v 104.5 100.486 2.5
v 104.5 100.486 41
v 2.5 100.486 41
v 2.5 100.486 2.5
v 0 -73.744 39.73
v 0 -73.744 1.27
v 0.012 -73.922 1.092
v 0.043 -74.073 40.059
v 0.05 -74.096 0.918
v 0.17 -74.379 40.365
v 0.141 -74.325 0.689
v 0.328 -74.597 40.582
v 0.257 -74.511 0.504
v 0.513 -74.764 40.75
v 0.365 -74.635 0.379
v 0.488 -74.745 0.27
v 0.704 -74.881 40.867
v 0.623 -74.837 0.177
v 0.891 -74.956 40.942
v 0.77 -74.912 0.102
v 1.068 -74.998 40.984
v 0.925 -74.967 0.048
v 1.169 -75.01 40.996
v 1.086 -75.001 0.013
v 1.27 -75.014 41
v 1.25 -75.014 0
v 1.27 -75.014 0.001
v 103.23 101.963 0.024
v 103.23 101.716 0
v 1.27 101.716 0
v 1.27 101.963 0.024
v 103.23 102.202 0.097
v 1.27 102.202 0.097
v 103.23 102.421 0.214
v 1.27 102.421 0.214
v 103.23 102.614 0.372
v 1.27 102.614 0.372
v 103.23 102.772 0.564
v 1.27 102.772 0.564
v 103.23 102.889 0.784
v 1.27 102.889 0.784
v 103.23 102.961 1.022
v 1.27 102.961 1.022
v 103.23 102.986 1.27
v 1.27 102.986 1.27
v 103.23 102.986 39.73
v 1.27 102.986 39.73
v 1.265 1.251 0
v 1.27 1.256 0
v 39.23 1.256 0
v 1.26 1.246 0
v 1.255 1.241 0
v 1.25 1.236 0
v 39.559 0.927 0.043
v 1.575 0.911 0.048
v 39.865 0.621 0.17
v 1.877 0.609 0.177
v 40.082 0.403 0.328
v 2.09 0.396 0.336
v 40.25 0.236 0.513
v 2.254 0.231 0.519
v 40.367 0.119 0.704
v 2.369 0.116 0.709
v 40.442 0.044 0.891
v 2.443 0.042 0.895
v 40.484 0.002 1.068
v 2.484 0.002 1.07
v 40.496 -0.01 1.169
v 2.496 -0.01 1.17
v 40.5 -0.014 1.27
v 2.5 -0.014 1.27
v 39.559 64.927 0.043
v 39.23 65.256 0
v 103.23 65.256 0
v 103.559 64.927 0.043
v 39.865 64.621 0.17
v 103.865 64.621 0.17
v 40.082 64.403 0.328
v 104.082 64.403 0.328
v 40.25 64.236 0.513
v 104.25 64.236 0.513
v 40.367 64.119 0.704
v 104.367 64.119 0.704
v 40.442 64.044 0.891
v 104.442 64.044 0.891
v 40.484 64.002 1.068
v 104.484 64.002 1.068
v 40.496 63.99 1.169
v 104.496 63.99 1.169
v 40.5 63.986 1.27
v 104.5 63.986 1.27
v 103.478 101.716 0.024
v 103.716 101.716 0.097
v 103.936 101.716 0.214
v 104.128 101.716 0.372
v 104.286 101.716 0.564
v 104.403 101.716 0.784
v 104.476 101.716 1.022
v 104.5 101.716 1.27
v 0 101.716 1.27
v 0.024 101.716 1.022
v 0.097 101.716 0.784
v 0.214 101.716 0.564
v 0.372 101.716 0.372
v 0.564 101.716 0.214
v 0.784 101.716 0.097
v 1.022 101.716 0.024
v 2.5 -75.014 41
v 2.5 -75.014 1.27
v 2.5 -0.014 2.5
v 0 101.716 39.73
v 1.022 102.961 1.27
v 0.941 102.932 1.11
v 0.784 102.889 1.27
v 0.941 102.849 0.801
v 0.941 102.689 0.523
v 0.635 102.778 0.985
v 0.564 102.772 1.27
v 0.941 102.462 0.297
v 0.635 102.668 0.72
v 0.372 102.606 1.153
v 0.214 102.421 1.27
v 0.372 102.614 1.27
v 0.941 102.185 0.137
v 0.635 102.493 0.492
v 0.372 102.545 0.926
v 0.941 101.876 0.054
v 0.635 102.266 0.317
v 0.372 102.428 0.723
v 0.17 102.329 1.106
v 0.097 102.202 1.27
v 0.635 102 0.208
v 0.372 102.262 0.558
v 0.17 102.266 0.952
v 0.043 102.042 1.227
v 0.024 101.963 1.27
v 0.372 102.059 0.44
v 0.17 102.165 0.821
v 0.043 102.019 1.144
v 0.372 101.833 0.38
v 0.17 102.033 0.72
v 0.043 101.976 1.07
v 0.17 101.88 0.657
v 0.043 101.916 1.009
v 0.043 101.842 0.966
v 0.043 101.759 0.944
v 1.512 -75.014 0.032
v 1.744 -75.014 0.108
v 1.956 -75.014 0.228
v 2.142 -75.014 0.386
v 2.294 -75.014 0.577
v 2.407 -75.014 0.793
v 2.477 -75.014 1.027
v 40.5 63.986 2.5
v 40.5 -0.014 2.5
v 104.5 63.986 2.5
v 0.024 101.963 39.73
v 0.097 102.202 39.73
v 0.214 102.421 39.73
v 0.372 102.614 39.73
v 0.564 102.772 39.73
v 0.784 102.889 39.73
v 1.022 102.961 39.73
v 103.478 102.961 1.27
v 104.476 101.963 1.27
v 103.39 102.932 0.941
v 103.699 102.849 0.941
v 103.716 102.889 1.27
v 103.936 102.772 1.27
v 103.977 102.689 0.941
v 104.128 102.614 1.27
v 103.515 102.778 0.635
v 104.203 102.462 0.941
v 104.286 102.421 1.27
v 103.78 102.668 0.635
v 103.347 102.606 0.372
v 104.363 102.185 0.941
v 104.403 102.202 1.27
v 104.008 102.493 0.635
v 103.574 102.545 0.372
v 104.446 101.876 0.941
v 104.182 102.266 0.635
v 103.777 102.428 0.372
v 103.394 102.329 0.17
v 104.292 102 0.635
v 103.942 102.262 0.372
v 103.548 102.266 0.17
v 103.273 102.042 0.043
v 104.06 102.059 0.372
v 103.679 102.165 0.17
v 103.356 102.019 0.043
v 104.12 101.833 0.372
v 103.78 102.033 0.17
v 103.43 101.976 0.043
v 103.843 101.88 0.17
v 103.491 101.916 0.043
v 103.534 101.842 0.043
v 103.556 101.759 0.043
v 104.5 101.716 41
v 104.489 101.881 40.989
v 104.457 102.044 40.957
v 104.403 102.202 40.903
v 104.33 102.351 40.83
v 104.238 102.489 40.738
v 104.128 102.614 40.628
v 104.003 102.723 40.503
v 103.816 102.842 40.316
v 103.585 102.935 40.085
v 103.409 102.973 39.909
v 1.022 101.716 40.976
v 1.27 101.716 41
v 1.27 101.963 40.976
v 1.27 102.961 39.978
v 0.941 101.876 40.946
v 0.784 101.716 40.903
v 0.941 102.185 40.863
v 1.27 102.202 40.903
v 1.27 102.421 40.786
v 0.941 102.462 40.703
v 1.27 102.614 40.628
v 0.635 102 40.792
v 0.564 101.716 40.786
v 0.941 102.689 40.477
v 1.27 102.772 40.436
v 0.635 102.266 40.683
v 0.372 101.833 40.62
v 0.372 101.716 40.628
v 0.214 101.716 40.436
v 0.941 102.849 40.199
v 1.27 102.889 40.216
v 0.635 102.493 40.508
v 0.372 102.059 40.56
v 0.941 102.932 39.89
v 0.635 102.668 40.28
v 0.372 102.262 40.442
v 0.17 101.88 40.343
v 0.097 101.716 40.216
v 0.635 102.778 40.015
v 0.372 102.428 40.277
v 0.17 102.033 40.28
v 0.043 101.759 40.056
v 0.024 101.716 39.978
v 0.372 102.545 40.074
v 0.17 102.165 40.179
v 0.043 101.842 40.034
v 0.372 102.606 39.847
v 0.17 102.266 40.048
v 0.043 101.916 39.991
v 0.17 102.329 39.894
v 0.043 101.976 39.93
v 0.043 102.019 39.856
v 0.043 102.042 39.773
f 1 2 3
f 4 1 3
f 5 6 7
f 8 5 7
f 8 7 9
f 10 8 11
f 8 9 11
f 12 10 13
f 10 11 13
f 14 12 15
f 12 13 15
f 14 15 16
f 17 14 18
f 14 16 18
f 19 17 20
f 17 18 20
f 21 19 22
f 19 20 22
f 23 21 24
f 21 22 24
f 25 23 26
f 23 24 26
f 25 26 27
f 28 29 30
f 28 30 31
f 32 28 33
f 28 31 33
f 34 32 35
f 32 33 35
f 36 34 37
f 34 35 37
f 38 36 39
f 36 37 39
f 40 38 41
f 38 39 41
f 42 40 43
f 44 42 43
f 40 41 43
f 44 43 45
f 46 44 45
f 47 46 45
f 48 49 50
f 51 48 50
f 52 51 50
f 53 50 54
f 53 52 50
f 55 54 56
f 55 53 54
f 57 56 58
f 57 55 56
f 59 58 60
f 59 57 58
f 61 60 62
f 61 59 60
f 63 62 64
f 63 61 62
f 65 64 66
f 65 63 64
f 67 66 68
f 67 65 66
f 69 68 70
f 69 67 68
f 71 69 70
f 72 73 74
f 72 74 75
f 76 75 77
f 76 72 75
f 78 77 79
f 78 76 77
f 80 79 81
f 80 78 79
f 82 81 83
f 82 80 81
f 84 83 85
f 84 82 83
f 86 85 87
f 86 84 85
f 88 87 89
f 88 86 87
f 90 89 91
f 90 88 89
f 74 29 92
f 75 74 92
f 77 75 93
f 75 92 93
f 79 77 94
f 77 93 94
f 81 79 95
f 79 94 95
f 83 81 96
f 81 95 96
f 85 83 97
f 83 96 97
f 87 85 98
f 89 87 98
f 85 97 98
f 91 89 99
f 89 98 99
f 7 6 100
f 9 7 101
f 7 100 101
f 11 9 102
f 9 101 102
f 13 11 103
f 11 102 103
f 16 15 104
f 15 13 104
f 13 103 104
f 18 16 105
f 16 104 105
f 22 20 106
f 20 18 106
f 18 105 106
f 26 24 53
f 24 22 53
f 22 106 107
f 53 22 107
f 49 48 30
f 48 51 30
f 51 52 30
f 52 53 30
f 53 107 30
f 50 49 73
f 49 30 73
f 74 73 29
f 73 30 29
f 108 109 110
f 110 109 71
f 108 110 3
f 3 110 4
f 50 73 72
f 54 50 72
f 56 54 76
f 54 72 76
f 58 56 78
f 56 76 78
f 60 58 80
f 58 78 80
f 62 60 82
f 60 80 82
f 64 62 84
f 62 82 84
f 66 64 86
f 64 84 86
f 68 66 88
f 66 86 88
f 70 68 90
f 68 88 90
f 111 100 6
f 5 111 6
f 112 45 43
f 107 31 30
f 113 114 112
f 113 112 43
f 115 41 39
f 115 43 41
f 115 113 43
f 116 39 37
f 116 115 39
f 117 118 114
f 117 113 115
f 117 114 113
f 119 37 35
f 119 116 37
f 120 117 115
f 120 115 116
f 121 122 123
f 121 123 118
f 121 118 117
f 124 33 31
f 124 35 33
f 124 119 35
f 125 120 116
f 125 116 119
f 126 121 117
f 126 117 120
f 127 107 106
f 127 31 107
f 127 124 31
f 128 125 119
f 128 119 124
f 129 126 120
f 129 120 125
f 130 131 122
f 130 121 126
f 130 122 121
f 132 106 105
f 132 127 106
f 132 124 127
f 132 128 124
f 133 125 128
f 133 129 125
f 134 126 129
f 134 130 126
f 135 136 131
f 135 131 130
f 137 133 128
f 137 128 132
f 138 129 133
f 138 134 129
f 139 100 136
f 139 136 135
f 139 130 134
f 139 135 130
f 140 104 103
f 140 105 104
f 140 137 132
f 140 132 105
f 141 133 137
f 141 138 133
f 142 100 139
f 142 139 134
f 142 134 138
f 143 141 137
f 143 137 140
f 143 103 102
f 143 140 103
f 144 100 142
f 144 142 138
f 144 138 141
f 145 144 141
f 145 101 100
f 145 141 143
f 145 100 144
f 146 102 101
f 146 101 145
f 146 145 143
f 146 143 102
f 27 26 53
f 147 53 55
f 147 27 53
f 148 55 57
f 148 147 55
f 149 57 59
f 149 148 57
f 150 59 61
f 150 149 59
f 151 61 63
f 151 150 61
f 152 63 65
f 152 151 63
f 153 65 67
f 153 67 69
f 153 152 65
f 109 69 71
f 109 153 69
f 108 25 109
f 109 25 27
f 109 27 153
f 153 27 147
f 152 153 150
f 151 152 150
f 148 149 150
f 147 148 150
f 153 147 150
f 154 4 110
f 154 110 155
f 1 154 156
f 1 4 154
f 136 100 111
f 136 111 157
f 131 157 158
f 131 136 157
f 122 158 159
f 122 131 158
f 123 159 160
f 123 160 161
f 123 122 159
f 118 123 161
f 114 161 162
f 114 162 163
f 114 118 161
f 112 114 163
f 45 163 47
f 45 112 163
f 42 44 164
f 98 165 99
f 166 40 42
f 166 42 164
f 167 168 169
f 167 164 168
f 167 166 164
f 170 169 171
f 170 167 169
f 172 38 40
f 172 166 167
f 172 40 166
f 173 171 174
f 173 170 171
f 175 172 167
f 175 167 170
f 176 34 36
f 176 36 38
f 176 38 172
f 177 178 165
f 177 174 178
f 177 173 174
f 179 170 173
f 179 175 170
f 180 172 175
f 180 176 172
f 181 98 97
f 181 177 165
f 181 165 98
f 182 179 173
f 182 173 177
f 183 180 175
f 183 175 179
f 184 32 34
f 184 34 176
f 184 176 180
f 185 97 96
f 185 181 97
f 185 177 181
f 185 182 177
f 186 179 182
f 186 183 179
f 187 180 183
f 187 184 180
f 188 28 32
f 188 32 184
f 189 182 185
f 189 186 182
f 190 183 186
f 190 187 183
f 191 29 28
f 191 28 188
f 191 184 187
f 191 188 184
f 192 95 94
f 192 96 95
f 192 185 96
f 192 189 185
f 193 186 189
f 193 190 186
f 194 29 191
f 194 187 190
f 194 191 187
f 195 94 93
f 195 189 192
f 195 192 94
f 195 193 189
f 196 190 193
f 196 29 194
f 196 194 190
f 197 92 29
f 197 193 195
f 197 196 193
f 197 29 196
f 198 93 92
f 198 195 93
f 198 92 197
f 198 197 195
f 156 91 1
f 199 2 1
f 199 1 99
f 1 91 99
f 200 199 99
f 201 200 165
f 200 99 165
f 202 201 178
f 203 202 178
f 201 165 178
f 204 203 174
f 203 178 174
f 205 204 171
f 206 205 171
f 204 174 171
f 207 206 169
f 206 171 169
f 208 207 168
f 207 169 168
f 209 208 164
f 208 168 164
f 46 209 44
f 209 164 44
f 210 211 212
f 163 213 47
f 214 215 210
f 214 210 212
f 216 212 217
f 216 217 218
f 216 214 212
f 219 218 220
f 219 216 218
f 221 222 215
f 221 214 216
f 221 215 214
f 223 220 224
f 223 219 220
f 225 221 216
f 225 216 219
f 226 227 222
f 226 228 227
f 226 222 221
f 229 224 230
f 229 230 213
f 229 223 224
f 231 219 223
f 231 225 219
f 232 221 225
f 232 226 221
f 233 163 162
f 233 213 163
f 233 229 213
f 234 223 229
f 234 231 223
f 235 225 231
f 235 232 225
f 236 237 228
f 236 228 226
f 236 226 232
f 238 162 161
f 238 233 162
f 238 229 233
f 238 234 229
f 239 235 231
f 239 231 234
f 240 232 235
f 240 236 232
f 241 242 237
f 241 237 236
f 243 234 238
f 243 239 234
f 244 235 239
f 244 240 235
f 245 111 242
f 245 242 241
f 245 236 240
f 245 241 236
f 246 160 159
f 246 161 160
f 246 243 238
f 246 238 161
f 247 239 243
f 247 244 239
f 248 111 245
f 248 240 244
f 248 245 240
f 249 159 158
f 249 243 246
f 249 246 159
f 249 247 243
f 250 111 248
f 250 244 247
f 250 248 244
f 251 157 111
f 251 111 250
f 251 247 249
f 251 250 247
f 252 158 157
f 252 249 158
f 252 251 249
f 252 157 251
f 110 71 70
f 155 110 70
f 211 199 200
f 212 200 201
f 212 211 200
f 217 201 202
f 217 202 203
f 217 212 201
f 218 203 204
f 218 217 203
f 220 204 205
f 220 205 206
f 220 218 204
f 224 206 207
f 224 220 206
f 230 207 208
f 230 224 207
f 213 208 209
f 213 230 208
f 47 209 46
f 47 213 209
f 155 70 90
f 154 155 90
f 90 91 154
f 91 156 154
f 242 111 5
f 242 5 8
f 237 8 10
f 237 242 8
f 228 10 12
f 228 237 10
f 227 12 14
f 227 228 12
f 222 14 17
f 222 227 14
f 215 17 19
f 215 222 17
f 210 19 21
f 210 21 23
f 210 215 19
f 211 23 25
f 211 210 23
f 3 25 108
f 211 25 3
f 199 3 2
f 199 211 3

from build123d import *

# Parameters (mm, degrees)
F1_DEPTH     = 41
F3_DEPTH     = 38.5
F5_T1_DEPTH  = 38.46
F5_T3_DEPTH  = 179.905
F5_T5_DEPTH  = 106.405
F5_T7_DEPTH  = 47.35
F5_T9_DEPTH  = 42.905
F5_T11_DEPTH = 78.175
F5_T13_DEPTH = 41.175
F5_T15_DEPTH = 67.175
F5_T17_DEPTH = 67.175
F5_T19_DEPTH = 40.905
F5_T21_DEPTH = 101.96
F5_S25_W     = 1.27
F5_S25_H     = 1.27
F5_T26_DEPTH = 1.27
F5_S31_W     = 1.27
F5_S31_H     = 1.27
F5_T32_DEPTH = 1.27
F5_S37_W     = 1.27
F5_S37_H     = 1.27
F5_T38_DEPTH = 1.27
F5_T45_DEPTH = 81.35
F5_T49_DEPTH = 44.35
F5_T56_DEPTH = 70.35
F5_T60_DEPTH = 70.35


# Not quite as in the source:
# - a fillet or chamfer that OpenCascade refuses, or shapes differently, is made with other operations: its cross-section is extruded or revolved along the edge and cut away or added
# - a feature of the source that left no trace in its solid (it failed there, or was rolled back) is left out


with BuildPart() as f1:
    # F0 (on Top) → F1 (new body)
    with BuildSketch(Plane.XY):
        Polygon((0, 102.9857128358), (0, 0), (0, -75.0142871642), (2.5, -75.0142871642), (2.5, -0.0142871642), (40.5, -0.0142871642), (40.5, 63.9857128358), (104.5, 63.9857128358), (104.5, 102.9857128358), align=None)
    extrude(amount=F1_DEPTH)

    # F2 (on face) → F3 (cut)
    with BuildSketch(Plane.XY.offset(41)):
        Polygon((2.5, 100.4857128358), (2.5, -0.0142871642), (40.5, -0.0142871642), (40.5, 63.9857128358), (104.5, 63.9857128358), (104.5, 100.4857128358), align=None)
    extrude(amount=-F3_DEPTH, mode=Mode.SUBTRACT)

    # F5: fillet of radius 1.27 on 12 edges, made by hand

    # F5_s2 → F5_t1 (cut)
    with BuildSketch(Plane.XY.offset(1.27)):
        with BuildLine():
            ThreePointArc((0, 101.7157128358), (0.3719743879, 102.6137384479), (1.27, 102.9857128358))
            Line((1.27, 102.9857128358), (0, 102.9857128358))
            Line((0, 102.9857128358), (0, 101.7157128358))
        make_face()
    extrude(amount=F5_T1_DEPTH, mode=Mode.SUBTRACT)

    # F5_s4 → F5_t3 (cut)
    with BuildSketch(Plane.XZ.offset(-101.7157128358)):
        with BuildLine():
            ThreePointArc((0, 39.73), (0.3719743879, 40.6280256121), (1.27, 41))
            Line((1.27, 41), (0, 41))
            Line((0, 41), (0, 39.73))
        make_face()
        with BuildLine():
            ThreePointArc((0, 1.27), (0.3719743879, 0.3719743879), (1.27, 0))
            Line((1.27, 0), (0, 0))
            Line((0, 0), (0, 1.27))
        make_face()
    extrude(amount=F5_T3_DEPTH, mode=Mode.SUBTRACT)

    # F5_s6 → F5_t5 (cut)
    with BuildSketch(Plane.YZ.offset(1.27)):
        with BuildLine():
            ThreePointArc((101.7157128358, 41), (102.6137384479, 40.6280256121), (102.9857128358, 39.73))
            Line((102.9857128358, 39.73), (102.9857128358, 41))
            Line((102.9857128358, 41), (101.7157128358, 41))
        make_face()
    extrude(amount=F5_T5_DEPTH, mode=Mode.SUBTRACT)

    # F5_s8 → F5_t7 (cut)
    with BuildSketch(Plane.XY.offset(-3.175)):
        with BuildLine():
            ThreePointArc((0, -73.7442871642), (0.3719743879, -74.6423127763), (1.27, -75.0142871642))
            Line((1.27, -75.0142871642), (0, -75.0142871642))
            Line((0, -75.0142871642), (0, -73.7442871642))
        make_face()
    extrude(amount=F5_T7_DEPTH, mode=Mode.SUBTRACT)

    # F5_s10 → F5_t9 (cut)
    with BuildSketch(Plane.XY.offset(1.27)):
        with BuildLine():
            ThreePointArc((104.5, 101.7157128358), (104.1280256121, 102.6137384479), (103.23, 102.9857128358))
            Line((103.23, 102.9857128358), (104.5, 102.9857128358))
            Line((104.5, 102.9857128358), (104.5, 101.7157128358))
        make_face()
    extrude(amount=F5_T9_DEPTH, mode=Mode.SUBTRACT)

    # F5_s12 → F5_t11 (cut)
    with BuildSketch(Plane.XZ.offset(0.0142871642)):
        with BuildLine():
            ThreePointArc((1.23, 0), (2.1280256121, 0.3719743879), (2.5, 1.27))
            Line((2.5, 1.27), (2.5, 0))
            Line((2.5, 0), (1.23, 0))
        make_face()
    extrude(amount=F5_T11_DEPTH, mode=Mode.SUBTRACT)

    # F5_s14 → F5_t13 (cut)
    with BuildSketch(Plane.YZ.offset(2.5)):
        with BuildLine():
            ThreePointArc((1.2557128358, 0), (0.3576872237, 0.3719743879), (-0.0142871642, 1.27))
            Line((-0.0142871642, 1.27), (-0.0142871642, 0))
            Line((-0.0142871642, 0), (1.2557128358, 0))
        make_face()
    extrude(amount=F5_T13_DEPTH, mode=Mode.SUBTRACT)

    # F5_s16 → F5_t15 (cut)
    with BuildSketch(Plane.XZ.offset(-63.9857128358)):
        with BuildLine():
            ThreePointArc((39.23, 0), (40.1280256121, 0.3719743879), (40.5, 1.27))
            Line((40.5, 1.27), (40.5, 0))
            Line((40.5, 0), (39.23, 0))
        make_face()
    extrude(amount=F5_T15_DEPTH, mode=Mode.SUBTRACT)

    # F5_s18 → F5_t17 (cut)
    with BuildSketch(Plane.YZ.offset(40.5)):
        with BuildLine():
            ThreePointArc((65.2557128358, 0), (64.3576872237, 0.3719743879), (63.9857128358, 1.27))
            Line((63.9857128358, 1.27), (63.9857128358, 0))
            Line((63.9857128358, 0), (65.2557128358, 0))
        make_face()
    extrude(amount=F5_T17_DEPTH, mode=Mode.SUBTRACT)

    # F5_s20 → F5_t19 (cut)
    with BuildSketch(Plane.XZ.offset(-101.7157128358)):
        with BuildLine():
            ThreePointArc((103.23, 0), (104.1280256121, 0.3719743879), (104.5, 1.27))
            Line((104.5, 1.27), (104.5, 0))
            Line((104.5, 0), (103.23, 0))
        make_face()
    extrude(amount=F5_T19_DEPTH, mode=Mode.SUBTRACT)

    # F5_s22 → F5_t21 (cut)
    with BuildSketch(Plane.YZ.offset(1.27)):
        with BuildLine():
            ThreePointArc((101.7157128358, 0), (102.6137384479, 0.3719743879), (102.9857128358, 1.27))
            Line((102.9857128358, 1.27), (102.9857128358, 0))
            Line((102.9857128358, 0), (101.7157128358, 0))
        make_face()
    extrude(amount=F5_T21_DEPTH, mode=Mode.SUBTRACT)


with BuildPart() as f5_tool24:
    # F5_s25 → F5_t26 (new body)
    with BuildSketch(Plane.YZ.offset(1.27)):
        with Locations((102.3507128358, 0.635)):
            Rectangle(F5_S25_W, F5_S25_H)
    extrude(amount=-F5_T26_DEPTH)

    # F5_s27 → F5_t28 (revolve, cut)
    with BuildSketch(Plane(origin=(1.27, 101.7157128358, 1.27), x_dir=(0, -0.7071067812, 0.7071067812), z_dir=(0, -0.7071067812, -0.7071067812))):
        with BuildLine():
            ThreePointArc((0, -1.27), (1.27, 0), (0, 1.27))
            Line((0, 1.27), (0, -1.27))
        make_face()
    revolve(axis=Axis((1.27, 101.7157128358, 1.27), (-1, 0, 0)), mode=Mode.SUBTRACT)


with BuildPart() as f1_1:
    add(f1.part)

    # F5_t23: cut F5_tool24
    add(f5_tool24.part, mode=Mode.SUBTRACT)


with BuildPart() as f5_tool30:
    # F5_s31 → F5_t32 (new body)
    with BuildSketch(Plane.YZ.offset(1.27)):
        with Locations((102.3507128358, 40.365)):
            Rectangle(F5_S31_W, F5_S31_H)
    extrude(amount=-F5_T32_DEPTH)

    # F5_s33 → F5_t34 (revolve, cut)
    with BuildSketch(Plane(origin=(1.27, 101.7157128358, 39.73), x_dir=(0, -0.7071067812, -0.7071067812), z_dir=(0, 0.7071067812, -0.7071067812))):
        with BuildLine():
            ThreePointArc((0, -1.27), (1.27, 0), (0, 1.27))
            Line((0, 1.27), (0, -1.27))
        make_face()
    revolve(axis=Axis((1.27, 101.7157128358, 39.73), (-1, 0, 0)), mode=Mode.SUBTRACT)


with BuildPart() as f1_2:
    add(f1_1.part)

    # F5_t29: cut F5_tool30
    add(f5_tool30.part, mode=Mode.SUBTRACT)


with BuildPart() as f5_tool36:
    # F5_s37 → F5_t38 (new body)
    with BuildSketch(Plane.XY.offset(1.27)):
        with Locations((103.865, 102.3507128358)):
            Rectangle(F5_S37_W, F5_S37_H)
    extrude(amount=-F5_T38_DEPTH)

    # F5_s39 → F5_t40 (revolve, cut)
    with BuildSketch(Plane(origin=(103.23, 101.7157128358, 1.27), x_dir=(-0.7071067812, -0.7071067812, 0), z_dir=(0.7071067812, -0.7071067812, 0))):
        with BuildLine():
            ThreePointArc((0, -1.27), (1.27, 0), (0, 1.27))
            Line((0, 1.27), (0, -1.27))
        make_face()
    revolve(axis=Axis((103.23, 101.7157128358, 1.27), (0, 0, -1)), mode=Mode.SUBTRACT)


with BuildPart() as f1_3:
    add(f1_2.part)

    # F5_t35: cut F5_tool36
    add(f5_tool36.part, mode=Mode.SUBTRACT)


with BuildPart() as f5_tool43:
    # F5_s44 → F5_t45 (new body)
    with BuildSketch(Plane.XZ.offset(78.1892871642)):
        with BuildLine():
            ThreePointArc((1.23, 0), (2.1280256121, 0.3719743879), (2.5, 1.27))
            Line((2.5, 1.27), (2.5, 0))
            Line((2.5, 0), (1.23, 0))
        make_face()
    extrude(amount=-F5_T45_DEPTH)

    split(bisect_by=Plane.XZ.offset(0.0142871642), keep=Keep.BOTTOM)


with BuildPart() as f5_tool47:
    # F5_s48 → F5_t49 (new body)
    with BuildSketch(Plane.YZ.offset(-0.675)):
        with BuildLine():
            ThreePointArc((1.2557128358, 0), (0.3576872237, 0.3719743879), (-0.0142871642, 1.27))
            Line((-0.0142871642, 1.27), (-0.0142871642, 0))
            Line((-0.0142871642, 0), (1.2557128358, 0))
        make_face()
    extrude(amount=F5_T49_DEPTH)

    split(bisect_by=Plane.YZ.offset(2.5), keep=Keep.BOTTOM)


with BuildPart() as f5_tool43_1:
    add(f5_tool43.part)

    # F5_t51: intersect F5_tool47
    add(f5_tool47.part, mode=Mode.INTERSECT)


with BuildPart() as f1_4:
    add(f1_3.part)

    # F5_t41: cut F5_tool43
    add(f5_tool43_1.part, mode=Mode.SUBTRACT)


with BuildPart() as f5_tool54:
    # F5_s55 → F5_t56 (new body)
    with BuildSketch(Plane.XZ.offset(3.1892871642)):
        with BuildLine():
            ThreePointArc((39.23, 0), (40.1280256121, 0.3719743879), (40.5, 1.27))
            Line((40.5, 1.27), (40.5, 0))
            Line((40.5, 0), (39.23, 0))
        make_face()
    extrude(amount=-F5_T56_DEPTH)

    split(bisect_by=Plane.XZ.offset(-63.9857128358), keep=Keep.BOTTOM)


with BuildPart() as f5_tool58:
    # F5_s59 → F5_t60 (new body)
    with BuildSketch(Plane.YZ.offset(37.325)):
        with BuildLine():
            ThreePointArc((65.2557128358, 0), (64.3576872237, 0.3719743879), (63.9857128358, 1.27))
            Line((63.9857128358, 1.27), (63.9857128358, 0))
            Line((63.9857128358, 0), (65.2557128358, 0))
        make_face()
    extrude(amount=F5_T60_DEPTH)

    split(bisect_by=Plane.YZ.offset(40.5), keep=Keep.BOTTOM)


with BuildPart() as f5_tool54_1:
    add(f5_tool54.part)

    # F5_t62: intersect F5_tool58
    add(f5_tool58.part, mode=Mode.INTERSECT)


with BuildPart() as f1_5:
    add(f1_4.part)

    # F5_t52: cut F5_tool54
    add(f5_tool54_1.part, mode=Mode.SUBTRACT)


solid = f1_5.part
